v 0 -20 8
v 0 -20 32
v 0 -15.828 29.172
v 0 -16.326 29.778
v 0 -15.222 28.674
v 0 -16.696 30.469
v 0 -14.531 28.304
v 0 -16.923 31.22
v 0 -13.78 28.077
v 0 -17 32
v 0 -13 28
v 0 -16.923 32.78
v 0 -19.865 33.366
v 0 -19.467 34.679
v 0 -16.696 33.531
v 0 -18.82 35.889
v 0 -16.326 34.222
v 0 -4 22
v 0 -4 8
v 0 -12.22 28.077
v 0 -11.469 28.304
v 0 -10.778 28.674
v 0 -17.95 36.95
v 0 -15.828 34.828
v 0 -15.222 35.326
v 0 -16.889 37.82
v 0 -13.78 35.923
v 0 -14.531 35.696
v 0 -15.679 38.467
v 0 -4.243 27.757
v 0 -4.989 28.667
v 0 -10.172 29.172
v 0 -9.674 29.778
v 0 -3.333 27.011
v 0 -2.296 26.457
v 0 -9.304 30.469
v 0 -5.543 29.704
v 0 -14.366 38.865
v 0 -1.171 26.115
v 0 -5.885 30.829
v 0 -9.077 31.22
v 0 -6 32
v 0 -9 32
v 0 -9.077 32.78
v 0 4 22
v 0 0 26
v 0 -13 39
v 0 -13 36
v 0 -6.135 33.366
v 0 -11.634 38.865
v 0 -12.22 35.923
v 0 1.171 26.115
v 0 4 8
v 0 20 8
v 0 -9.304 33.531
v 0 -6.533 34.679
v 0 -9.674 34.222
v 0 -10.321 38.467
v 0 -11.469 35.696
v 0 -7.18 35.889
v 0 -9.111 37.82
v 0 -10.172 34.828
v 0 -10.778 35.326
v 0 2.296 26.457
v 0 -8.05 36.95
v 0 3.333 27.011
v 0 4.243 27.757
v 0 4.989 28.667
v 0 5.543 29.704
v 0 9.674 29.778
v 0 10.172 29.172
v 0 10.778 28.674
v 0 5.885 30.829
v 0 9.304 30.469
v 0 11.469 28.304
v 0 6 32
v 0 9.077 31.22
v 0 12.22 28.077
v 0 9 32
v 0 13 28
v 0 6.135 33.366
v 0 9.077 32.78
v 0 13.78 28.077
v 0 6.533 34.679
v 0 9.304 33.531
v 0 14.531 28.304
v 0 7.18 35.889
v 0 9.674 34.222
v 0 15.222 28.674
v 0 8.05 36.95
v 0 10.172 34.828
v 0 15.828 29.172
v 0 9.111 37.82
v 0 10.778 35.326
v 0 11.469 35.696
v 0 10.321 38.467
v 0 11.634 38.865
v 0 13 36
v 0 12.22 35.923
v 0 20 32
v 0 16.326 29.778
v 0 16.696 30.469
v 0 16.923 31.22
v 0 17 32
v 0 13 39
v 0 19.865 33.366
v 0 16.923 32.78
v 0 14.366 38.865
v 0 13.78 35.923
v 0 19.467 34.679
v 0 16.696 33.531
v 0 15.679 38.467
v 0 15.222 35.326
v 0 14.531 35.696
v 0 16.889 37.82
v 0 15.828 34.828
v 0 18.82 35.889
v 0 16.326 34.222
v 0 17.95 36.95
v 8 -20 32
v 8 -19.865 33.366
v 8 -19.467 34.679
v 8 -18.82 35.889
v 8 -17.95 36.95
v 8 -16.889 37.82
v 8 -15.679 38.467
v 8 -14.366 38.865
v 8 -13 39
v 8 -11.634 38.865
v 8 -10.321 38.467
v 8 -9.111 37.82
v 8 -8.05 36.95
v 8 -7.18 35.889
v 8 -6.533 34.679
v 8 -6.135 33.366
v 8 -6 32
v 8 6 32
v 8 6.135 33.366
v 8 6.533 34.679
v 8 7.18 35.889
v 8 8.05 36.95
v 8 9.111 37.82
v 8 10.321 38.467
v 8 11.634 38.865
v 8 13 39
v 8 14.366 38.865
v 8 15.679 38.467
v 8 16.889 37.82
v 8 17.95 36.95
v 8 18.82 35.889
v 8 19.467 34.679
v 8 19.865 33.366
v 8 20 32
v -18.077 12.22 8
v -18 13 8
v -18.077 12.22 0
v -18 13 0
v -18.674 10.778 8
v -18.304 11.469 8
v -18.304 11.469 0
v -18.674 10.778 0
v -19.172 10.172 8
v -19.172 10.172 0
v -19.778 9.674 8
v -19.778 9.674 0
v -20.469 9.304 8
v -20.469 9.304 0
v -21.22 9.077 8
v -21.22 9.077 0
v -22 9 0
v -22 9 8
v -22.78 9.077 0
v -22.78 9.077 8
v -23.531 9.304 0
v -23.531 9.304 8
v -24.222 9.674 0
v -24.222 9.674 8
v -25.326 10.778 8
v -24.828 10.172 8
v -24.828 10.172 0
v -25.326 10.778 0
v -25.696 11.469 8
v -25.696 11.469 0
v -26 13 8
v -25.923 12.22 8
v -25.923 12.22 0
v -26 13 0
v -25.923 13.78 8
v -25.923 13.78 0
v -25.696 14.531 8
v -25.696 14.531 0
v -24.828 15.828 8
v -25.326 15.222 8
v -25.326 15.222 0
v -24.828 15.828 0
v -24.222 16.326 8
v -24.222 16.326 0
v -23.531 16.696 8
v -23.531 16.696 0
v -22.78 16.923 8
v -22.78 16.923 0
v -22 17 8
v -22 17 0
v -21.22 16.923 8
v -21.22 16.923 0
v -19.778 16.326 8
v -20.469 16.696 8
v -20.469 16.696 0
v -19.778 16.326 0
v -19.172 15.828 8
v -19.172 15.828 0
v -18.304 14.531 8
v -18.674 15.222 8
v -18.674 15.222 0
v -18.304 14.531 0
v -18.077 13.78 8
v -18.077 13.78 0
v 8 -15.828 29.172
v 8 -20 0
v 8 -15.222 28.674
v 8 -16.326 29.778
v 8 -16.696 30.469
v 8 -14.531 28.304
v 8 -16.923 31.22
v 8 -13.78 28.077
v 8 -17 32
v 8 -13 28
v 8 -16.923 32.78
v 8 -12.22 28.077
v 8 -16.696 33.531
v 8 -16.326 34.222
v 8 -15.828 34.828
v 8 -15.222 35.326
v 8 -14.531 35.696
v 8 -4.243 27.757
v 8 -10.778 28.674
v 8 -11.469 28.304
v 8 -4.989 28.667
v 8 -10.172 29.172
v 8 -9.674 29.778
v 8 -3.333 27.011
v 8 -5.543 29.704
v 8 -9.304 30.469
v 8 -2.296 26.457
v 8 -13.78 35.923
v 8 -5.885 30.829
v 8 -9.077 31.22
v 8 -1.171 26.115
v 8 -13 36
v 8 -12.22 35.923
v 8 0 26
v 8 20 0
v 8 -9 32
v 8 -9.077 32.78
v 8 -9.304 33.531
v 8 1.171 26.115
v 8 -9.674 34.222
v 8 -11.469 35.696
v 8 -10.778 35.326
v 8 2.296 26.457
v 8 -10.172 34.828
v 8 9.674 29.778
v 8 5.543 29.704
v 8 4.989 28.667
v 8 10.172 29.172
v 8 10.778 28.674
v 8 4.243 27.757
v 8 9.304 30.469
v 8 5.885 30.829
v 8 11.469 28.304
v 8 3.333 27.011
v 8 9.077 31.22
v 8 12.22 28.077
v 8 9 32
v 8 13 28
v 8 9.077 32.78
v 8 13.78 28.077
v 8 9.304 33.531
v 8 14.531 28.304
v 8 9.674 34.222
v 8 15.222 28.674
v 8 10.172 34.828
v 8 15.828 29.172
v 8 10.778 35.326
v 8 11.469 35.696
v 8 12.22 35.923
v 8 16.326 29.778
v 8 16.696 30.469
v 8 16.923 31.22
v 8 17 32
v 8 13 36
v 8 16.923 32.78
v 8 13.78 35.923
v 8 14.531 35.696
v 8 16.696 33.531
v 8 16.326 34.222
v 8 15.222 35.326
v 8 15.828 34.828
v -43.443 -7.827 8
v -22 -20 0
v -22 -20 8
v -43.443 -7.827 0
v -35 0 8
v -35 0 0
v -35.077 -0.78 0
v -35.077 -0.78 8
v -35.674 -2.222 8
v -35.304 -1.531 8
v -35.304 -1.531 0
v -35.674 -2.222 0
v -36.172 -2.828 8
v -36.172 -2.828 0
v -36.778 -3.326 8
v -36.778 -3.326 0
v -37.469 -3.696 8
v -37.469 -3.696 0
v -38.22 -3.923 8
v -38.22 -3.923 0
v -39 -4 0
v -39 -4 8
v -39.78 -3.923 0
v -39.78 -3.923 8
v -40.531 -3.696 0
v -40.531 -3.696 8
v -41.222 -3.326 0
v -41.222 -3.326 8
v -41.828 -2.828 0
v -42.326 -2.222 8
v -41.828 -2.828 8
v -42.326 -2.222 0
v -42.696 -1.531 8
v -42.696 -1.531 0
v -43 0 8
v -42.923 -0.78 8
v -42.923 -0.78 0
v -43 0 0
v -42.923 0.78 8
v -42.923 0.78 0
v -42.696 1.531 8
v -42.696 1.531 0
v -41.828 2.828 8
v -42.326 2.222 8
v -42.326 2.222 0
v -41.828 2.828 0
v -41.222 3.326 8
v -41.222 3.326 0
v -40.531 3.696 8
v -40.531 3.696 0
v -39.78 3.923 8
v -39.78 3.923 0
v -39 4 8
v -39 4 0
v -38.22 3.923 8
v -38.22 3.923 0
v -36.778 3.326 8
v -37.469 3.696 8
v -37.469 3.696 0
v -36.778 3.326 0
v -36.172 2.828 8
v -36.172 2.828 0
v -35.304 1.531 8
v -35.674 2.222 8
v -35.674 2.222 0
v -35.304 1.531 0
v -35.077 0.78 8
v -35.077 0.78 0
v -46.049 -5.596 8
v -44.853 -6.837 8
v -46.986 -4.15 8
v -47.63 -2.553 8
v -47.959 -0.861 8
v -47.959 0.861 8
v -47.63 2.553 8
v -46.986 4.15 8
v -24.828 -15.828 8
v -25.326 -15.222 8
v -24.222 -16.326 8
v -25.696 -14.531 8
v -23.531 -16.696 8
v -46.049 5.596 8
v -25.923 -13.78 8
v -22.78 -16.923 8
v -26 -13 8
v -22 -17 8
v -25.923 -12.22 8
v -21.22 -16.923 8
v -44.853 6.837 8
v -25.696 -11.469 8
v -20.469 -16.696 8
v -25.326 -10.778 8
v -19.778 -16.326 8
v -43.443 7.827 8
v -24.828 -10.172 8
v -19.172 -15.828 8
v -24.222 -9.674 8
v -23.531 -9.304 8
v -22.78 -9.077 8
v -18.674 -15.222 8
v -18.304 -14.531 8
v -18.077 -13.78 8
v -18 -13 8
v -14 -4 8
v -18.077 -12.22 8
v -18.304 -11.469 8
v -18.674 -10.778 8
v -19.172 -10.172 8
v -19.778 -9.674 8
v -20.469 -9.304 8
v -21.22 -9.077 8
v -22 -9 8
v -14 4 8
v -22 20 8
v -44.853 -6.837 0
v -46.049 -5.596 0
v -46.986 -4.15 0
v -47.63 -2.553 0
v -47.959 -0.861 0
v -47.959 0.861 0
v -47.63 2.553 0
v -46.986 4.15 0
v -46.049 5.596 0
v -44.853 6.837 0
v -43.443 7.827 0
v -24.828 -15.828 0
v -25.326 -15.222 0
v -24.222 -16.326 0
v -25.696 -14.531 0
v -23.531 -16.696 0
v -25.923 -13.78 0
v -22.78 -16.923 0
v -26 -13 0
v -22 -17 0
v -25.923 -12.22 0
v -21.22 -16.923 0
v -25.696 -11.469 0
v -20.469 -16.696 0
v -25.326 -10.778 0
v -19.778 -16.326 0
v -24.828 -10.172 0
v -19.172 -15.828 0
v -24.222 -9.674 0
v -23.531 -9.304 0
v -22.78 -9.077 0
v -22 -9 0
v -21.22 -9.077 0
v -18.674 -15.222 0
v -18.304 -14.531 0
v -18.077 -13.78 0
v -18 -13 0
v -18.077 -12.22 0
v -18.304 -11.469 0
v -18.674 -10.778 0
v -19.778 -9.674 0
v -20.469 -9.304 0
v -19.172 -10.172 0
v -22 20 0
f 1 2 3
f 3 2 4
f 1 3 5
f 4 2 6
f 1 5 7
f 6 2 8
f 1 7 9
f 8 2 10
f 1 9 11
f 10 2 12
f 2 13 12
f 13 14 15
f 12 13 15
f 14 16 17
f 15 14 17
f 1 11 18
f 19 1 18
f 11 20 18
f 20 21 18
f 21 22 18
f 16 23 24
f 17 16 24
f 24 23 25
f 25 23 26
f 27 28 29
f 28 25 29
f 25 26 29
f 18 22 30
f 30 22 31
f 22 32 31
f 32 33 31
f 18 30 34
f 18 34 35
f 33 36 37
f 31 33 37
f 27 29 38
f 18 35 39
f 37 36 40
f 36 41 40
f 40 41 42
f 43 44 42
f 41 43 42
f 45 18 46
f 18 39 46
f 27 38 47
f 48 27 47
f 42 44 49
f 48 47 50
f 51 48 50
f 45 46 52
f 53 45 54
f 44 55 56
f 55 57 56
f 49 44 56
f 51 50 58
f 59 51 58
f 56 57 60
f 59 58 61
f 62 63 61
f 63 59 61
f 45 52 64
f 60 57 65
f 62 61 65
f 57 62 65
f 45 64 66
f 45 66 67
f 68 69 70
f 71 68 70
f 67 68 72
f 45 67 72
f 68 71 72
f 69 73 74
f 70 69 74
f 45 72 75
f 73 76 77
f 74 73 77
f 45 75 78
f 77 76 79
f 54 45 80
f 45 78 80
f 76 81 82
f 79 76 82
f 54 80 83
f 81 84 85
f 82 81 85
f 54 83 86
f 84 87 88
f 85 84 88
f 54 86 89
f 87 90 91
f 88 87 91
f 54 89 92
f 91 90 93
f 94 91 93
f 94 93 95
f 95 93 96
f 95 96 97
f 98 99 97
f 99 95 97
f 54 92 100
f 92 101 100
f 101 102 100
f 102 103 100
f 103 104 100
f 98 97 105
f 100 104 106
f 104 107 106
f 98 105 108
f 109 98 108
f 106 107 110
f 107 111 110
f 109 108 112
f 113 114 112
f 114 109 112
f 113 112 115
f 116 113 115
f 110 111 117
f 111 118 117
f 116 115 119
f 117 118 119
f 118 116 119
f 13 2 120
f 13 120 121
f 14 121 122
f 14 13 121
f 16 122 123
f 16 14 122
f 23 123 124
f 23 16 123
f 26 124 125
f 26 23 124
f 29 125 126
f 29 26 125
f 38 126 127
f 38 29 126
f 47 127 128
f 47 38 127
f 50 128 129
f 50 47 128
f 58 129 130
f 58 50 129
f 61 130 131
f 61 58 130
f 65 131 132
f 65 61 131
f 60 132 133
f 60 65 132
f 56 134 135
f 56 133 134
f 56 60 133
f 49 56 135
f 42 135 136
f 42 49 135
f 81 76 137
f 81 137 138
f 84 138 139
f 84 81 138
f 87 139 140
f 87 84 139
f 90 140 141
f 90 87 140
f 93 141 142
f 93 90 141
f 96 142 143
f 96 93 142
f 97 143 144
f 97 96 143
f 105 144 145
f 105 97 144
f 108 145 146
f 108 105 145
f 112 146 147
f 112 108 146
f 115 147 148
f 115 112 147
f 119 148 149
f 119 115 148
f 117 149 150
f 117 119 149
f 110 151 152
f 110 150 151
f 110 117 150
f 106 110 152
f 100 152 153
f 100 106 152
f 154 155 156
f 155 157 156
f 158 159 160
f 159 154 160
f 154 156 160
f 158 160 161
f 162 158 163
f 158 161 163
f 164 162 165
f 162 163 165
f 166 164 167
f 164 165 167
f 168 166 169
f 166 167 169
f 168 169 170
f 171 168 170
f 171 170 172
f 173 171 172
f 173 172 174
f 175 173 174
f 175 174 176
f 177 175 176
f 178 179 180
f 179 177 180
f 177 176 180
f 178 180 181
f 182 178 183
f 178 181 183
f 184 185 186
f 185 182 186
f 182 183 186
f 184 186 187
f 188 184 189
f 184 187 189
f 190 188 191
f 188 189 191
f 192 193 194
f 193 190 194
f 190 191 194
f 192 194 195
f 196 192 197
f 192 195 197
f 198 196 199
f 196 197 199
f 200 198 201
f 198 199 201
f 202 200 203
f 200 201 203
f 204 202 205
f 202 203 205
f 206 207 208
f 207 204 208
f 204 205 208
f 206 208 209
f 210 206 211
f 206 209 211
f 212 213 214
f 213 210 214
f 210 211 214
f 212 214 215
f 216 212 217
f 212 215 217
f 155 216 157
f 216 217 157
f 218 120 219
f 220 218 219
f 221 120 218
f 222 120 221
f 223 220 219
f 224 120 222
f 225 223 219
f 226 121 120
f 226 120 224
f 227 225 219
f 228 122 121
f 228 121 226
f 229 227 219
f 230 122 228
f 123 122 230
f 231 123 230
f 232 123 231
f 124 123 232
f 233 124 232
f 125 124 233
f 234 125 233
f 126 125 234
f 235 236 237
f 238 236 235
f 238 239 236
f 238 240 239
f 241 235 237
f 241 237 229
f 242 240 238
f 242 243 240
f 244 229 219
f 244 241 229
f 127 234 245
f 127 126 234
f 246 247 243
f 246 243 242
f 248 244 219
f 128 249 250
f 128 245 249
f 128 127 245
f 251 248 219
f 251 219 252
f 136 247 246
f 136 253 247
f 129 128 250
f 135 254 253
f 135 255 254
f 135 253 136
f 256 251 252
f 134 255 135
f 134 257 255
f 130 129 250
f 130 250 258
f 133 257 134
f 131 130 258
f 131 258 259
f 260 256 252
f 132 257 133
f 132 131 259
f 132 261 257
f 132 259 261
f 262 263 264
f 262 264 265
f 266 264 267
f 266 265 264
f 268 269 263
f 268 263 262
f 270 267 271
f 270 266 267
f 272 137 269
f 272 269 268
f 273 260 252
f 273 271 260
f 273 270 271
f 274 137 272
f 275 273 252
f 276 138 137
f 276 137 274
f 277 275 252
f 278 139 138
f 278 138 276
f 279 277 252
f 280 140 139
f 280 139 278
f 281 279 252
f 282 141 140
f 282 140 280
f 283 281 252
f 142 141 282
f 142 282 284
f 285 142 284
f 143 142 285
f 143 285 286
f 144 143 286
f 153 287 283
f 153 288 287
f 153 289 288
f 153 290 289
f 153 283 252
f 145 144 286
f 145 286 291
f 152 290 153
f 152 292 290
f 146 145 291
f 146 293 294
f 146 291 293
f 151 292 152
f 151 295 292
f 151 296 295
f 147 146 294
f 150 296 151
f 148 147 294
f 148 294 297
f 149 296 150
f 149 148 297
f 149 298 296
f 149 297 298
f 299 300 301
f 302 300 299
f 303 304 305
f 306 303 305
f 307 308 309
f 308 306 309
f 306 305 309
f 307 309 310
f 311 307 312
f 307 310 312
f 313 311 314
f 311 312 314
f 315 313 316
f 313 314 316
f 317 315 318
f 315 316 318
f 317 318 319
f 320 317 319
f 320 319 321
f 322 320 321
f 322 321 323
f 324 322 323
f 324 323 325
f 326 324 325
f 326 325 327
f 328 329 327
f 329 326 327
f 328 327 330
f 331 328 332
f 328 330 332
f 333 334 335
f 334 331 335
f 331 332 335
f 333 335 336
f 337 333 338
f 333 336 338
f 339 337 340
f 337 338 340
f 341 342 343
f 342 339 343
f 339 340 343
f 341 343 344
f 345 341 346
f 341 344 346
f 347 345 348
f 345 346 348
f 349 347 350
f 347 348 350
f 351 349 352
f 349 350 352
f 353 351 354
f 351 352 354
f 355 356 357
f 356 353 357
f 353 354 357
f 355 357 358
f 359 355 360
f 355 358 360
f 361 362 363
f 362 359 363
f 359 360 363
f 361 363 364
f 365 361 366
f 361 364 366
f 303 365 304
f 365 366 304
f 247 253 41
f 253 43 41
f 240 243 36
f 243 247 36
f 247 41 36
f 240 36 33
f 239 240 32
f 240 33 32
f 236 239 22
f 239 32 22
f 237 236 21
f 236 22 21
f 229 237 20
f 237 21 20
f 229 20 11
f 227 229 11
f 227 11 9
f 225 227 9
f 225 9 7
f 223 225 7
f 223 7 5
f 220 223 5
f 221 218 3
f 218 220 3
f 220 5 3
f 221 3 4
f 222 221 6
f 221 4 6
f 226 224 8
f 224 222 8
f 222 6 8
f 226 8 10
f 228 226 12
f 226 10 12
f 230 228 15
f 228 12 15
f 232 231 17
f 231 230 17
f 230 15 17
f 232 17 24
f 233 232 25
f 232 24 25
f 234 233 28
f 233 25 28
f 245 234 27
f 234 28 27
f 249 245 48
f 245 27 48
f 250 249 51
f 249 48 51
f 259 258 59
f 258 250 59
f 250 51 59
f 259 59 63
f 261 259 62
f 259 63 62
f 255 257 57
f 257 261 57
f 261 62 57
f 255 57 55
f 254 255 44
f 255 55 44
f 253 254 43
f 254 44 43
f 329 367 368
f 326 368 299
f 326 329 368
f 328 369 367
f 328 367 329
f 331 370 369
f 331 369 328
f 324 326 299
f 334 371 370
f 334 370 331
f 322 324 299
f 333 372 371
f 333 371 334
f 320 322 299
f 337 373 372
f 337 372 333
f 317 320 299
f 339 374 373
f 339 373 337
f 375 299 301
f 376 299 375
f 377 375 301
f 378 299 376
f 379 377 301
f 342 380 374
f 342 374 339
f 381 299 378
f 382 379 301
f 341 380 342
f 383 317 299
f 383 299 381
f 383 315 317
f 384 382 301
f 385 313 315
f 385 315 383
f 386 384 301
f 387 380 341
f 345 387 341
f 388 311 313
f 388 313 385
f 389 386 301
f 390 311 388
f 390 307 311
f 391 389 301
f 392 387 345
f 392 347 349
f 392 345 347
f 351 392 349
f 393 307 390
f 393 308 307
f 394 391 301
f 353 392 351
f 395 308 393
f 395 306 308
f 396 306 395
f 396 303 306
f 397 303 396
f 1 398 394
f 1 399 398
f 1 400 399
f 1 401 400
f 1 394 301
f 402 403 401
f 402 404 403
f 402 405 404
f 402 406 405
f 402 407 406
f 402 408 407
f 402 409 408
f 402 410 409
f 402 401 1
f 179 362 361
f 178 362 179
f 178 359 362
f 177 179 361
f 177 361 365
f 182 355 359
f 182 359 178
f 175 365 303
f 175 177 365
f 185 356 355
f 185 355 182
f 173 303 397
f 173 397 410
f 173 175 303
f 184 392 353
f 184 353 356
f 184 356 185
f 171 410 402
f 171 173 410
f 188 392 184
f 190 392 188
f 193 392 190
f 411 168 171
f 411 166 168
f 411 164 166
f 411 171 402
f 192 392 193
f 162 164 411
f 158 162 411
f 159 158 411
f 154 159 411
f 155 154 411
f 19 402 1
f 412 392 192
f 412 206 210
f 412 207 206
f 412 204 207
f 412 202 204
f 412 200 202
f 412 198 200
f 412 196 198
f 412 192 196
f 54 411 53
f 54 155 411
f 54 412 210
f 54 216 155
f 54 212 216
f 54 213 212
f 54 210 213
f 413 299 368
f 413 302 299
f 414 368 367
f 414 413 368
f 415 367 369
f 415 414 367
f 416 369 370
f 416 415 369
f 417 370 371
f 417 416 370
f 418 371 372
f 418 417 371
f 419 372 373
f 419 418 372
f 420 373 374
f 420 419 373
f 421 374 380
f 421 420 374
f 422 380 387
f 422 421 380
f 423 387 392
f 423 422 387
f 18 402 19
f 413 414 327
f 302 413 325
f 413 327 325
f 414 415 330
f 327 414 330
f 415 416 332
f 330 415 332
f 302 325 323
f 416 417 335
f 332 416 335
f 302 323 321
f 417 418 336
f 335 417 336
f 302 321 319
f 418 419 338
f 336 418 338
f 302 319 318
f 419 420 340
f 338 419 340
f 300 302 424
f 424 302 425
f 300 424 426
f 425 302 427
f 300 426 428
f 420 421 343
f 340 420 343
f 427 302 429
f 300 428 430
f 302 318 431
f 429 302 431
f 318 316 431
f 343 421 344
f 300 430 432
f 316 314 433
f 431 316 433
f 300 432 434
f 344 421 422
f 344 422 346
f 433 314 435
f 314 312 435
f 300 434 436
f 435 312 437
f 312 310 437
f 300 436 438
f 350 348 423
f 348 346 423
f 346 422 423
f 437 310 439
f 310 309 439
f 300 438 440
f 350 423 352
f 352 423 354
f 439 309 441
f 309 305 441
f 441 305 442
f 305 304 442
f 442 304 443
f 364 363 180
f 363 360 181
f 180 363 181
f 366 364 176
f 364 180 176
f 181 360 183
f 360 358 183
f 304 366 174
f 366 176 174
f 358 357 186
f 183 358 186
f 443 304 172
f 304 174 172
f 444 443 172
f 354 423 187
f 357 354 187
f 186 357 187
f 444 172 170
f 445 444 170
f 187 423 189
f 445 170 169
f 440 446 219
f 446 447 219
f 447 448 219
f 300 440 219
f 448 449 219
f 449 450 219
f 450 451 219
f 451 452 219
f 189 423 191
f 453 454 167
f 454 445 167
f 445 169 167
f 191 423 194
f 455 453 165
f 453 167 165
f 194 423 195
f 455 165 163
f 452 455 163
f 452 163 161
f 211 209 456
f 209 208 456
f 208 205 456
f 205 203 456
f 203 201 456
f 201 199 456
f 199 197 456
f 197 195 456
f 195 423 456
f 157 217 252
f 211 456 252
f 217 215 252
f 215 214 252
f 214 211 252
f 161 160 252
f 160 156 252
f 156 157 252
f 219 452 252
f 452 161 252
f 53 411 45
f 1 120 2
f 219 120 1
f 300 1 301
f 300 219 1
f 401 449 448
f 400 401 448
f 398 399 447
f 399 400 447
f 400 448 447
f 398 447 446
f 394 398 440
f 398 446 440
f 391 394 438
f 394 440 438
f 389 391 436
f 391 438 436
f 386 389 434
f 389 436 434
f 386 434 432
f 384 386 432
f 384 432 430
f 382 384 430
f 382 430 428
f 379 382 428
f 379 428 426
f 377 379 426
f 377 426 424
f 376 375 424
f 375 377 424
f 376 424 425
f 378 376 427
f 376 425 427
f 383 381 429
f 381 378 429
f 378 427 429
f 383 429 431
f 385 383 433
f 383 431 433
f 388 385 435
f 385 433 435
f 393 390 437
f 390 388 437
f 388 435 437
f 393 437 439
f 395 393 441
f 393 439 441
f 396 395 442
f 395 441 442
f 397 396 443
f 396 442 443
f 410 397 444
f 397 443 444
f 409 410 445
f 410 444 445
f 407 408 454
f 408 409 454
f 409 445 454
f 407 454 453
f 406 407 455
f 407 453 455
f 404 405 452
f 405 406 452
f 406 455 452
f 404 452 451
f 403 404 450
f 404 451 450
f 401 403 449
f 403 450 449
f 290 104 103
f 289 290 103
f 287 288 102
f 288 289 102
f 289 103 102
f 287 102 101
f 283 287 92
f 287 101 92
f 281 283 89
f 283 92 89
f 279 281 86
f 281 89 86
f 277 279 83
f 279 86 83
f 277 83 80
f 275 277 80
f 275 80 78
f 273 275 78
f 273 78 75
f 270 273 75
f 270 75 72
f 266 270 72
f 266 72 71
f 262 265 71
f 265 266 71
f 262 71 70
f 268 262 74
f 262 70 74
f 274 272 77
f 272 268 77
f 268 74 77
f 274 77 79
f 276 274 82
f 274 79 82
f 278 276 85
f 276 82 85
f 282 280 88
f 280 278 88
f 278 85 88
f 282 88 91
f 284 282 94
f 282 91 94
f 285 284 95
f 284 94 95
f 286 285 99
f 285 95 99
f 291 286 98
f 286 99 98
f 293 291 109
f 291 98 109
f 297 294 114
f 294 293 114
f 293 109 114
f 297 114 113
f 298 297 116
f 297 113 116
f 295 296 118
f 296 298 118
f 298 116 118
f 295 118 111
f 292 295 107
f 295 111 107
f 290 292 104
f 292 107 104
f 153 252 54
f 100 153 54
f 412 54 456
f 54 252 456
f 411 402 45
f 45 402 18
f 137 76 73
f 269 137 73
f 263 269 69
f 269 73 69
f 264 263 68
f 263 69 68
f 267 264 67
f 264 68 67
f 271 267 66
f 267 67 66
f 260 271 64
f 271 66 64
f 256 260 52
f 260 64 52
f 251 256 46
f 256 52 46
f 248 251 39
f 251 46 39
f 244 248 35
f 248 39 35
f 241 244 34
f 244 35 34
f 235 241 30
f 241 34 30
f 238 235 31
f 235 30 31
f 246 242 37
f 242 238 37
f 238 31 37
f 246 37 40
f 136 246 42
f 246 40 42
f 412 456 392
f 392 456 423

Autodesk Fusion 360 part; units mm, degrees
sketch "草图1" plane through (0, 0, 0) normal (0, 0, 1) x (1, 0, 0)
  line L0 (0, -40) -> (0, 55) construction
  line L1 (-75, 0) -> (190, 0) construction
  line L2 (0, -35) -> (0, -32.2208) construction
  line L3 (0, -20) -> (0, 20)
  line L4 (0, 20) -> (-22, 20)
  line L5 (-22, 20) -> (-43.4432, 7.8267)
  line L6 (0, -20) -> (-22, -20)
  line L7 (-22, -20) -> (-43.4432, -7.8267)
  arc A0 (-43.4432, 7.8267) -> (-43.4432, -7.8267) centre (-39, 0) ccw
  circle A1 centre (-39, 0) radius 4
  circle A2 centre (-22, 13) radius 4
  circle A3 centre (-22, -13) radius 4
  dimension "d1" = 40
  dimension "d2" = 22
  dimension "d3" = 39
  dimension "d4" = 9
  dimension "d5" = 8
  dimension "d6" = 26
  dimension "d7" = 22
extrude "拉伸1" add sketch "草图1" along normal blind 8
sketch "草图2" plane through (0, 0, 0) normal (1, 0, 0) x (0, 1, 0)
  line L0 (-20, 0) -> (20, 0)
  line L1 (20, 0) -> (20, 8)
  line L2 (20, 8) -> (-20, 8)
  line L3 (-20, 8) -> (-20, 0)
  line L4 (0, 39) -> (0, -13) construction
  line L5 (-35, 0) -> (42, 0) construction
  line L6 (-20, 0) -> (-20, 32)
  line L7 (20, 0) -> (20, 32)
  circle A0 centre (-13, 32) radius 4
  circle A1 centre (13, 32) radius 4
  arc A2 (-6, 32) -> (-20, 32) centre (-13, 32) ccw
  arc A3 (-6, 32) -> (6, 32) centre (0, 32) ccw
  arc A4 (20, 32) -> (6, 32) centre (13, 32) ccw
  dimension "d10" = 8
  dimension "d11" = 26
  dimension "d12" = 32
extrude "拉伸2" add sketch "草图2" along normal blind 8
sketch "草图3" plane through (0, 0, 0) normal (0, 1, 0) x (1, 0, 0)
  line L0 (0, -8) -> (-14, -8)
  line L1 (-14, -8) -> (0, -22)
  line L2 (0, -22) -> (0, -8)
  dimension "d15" = 14
  dimension "d16" = 14
extrude "拉伸3" add sketch "草图3" along normal mid plane 8
equation "d3 = 17 mm + 22 mm"
